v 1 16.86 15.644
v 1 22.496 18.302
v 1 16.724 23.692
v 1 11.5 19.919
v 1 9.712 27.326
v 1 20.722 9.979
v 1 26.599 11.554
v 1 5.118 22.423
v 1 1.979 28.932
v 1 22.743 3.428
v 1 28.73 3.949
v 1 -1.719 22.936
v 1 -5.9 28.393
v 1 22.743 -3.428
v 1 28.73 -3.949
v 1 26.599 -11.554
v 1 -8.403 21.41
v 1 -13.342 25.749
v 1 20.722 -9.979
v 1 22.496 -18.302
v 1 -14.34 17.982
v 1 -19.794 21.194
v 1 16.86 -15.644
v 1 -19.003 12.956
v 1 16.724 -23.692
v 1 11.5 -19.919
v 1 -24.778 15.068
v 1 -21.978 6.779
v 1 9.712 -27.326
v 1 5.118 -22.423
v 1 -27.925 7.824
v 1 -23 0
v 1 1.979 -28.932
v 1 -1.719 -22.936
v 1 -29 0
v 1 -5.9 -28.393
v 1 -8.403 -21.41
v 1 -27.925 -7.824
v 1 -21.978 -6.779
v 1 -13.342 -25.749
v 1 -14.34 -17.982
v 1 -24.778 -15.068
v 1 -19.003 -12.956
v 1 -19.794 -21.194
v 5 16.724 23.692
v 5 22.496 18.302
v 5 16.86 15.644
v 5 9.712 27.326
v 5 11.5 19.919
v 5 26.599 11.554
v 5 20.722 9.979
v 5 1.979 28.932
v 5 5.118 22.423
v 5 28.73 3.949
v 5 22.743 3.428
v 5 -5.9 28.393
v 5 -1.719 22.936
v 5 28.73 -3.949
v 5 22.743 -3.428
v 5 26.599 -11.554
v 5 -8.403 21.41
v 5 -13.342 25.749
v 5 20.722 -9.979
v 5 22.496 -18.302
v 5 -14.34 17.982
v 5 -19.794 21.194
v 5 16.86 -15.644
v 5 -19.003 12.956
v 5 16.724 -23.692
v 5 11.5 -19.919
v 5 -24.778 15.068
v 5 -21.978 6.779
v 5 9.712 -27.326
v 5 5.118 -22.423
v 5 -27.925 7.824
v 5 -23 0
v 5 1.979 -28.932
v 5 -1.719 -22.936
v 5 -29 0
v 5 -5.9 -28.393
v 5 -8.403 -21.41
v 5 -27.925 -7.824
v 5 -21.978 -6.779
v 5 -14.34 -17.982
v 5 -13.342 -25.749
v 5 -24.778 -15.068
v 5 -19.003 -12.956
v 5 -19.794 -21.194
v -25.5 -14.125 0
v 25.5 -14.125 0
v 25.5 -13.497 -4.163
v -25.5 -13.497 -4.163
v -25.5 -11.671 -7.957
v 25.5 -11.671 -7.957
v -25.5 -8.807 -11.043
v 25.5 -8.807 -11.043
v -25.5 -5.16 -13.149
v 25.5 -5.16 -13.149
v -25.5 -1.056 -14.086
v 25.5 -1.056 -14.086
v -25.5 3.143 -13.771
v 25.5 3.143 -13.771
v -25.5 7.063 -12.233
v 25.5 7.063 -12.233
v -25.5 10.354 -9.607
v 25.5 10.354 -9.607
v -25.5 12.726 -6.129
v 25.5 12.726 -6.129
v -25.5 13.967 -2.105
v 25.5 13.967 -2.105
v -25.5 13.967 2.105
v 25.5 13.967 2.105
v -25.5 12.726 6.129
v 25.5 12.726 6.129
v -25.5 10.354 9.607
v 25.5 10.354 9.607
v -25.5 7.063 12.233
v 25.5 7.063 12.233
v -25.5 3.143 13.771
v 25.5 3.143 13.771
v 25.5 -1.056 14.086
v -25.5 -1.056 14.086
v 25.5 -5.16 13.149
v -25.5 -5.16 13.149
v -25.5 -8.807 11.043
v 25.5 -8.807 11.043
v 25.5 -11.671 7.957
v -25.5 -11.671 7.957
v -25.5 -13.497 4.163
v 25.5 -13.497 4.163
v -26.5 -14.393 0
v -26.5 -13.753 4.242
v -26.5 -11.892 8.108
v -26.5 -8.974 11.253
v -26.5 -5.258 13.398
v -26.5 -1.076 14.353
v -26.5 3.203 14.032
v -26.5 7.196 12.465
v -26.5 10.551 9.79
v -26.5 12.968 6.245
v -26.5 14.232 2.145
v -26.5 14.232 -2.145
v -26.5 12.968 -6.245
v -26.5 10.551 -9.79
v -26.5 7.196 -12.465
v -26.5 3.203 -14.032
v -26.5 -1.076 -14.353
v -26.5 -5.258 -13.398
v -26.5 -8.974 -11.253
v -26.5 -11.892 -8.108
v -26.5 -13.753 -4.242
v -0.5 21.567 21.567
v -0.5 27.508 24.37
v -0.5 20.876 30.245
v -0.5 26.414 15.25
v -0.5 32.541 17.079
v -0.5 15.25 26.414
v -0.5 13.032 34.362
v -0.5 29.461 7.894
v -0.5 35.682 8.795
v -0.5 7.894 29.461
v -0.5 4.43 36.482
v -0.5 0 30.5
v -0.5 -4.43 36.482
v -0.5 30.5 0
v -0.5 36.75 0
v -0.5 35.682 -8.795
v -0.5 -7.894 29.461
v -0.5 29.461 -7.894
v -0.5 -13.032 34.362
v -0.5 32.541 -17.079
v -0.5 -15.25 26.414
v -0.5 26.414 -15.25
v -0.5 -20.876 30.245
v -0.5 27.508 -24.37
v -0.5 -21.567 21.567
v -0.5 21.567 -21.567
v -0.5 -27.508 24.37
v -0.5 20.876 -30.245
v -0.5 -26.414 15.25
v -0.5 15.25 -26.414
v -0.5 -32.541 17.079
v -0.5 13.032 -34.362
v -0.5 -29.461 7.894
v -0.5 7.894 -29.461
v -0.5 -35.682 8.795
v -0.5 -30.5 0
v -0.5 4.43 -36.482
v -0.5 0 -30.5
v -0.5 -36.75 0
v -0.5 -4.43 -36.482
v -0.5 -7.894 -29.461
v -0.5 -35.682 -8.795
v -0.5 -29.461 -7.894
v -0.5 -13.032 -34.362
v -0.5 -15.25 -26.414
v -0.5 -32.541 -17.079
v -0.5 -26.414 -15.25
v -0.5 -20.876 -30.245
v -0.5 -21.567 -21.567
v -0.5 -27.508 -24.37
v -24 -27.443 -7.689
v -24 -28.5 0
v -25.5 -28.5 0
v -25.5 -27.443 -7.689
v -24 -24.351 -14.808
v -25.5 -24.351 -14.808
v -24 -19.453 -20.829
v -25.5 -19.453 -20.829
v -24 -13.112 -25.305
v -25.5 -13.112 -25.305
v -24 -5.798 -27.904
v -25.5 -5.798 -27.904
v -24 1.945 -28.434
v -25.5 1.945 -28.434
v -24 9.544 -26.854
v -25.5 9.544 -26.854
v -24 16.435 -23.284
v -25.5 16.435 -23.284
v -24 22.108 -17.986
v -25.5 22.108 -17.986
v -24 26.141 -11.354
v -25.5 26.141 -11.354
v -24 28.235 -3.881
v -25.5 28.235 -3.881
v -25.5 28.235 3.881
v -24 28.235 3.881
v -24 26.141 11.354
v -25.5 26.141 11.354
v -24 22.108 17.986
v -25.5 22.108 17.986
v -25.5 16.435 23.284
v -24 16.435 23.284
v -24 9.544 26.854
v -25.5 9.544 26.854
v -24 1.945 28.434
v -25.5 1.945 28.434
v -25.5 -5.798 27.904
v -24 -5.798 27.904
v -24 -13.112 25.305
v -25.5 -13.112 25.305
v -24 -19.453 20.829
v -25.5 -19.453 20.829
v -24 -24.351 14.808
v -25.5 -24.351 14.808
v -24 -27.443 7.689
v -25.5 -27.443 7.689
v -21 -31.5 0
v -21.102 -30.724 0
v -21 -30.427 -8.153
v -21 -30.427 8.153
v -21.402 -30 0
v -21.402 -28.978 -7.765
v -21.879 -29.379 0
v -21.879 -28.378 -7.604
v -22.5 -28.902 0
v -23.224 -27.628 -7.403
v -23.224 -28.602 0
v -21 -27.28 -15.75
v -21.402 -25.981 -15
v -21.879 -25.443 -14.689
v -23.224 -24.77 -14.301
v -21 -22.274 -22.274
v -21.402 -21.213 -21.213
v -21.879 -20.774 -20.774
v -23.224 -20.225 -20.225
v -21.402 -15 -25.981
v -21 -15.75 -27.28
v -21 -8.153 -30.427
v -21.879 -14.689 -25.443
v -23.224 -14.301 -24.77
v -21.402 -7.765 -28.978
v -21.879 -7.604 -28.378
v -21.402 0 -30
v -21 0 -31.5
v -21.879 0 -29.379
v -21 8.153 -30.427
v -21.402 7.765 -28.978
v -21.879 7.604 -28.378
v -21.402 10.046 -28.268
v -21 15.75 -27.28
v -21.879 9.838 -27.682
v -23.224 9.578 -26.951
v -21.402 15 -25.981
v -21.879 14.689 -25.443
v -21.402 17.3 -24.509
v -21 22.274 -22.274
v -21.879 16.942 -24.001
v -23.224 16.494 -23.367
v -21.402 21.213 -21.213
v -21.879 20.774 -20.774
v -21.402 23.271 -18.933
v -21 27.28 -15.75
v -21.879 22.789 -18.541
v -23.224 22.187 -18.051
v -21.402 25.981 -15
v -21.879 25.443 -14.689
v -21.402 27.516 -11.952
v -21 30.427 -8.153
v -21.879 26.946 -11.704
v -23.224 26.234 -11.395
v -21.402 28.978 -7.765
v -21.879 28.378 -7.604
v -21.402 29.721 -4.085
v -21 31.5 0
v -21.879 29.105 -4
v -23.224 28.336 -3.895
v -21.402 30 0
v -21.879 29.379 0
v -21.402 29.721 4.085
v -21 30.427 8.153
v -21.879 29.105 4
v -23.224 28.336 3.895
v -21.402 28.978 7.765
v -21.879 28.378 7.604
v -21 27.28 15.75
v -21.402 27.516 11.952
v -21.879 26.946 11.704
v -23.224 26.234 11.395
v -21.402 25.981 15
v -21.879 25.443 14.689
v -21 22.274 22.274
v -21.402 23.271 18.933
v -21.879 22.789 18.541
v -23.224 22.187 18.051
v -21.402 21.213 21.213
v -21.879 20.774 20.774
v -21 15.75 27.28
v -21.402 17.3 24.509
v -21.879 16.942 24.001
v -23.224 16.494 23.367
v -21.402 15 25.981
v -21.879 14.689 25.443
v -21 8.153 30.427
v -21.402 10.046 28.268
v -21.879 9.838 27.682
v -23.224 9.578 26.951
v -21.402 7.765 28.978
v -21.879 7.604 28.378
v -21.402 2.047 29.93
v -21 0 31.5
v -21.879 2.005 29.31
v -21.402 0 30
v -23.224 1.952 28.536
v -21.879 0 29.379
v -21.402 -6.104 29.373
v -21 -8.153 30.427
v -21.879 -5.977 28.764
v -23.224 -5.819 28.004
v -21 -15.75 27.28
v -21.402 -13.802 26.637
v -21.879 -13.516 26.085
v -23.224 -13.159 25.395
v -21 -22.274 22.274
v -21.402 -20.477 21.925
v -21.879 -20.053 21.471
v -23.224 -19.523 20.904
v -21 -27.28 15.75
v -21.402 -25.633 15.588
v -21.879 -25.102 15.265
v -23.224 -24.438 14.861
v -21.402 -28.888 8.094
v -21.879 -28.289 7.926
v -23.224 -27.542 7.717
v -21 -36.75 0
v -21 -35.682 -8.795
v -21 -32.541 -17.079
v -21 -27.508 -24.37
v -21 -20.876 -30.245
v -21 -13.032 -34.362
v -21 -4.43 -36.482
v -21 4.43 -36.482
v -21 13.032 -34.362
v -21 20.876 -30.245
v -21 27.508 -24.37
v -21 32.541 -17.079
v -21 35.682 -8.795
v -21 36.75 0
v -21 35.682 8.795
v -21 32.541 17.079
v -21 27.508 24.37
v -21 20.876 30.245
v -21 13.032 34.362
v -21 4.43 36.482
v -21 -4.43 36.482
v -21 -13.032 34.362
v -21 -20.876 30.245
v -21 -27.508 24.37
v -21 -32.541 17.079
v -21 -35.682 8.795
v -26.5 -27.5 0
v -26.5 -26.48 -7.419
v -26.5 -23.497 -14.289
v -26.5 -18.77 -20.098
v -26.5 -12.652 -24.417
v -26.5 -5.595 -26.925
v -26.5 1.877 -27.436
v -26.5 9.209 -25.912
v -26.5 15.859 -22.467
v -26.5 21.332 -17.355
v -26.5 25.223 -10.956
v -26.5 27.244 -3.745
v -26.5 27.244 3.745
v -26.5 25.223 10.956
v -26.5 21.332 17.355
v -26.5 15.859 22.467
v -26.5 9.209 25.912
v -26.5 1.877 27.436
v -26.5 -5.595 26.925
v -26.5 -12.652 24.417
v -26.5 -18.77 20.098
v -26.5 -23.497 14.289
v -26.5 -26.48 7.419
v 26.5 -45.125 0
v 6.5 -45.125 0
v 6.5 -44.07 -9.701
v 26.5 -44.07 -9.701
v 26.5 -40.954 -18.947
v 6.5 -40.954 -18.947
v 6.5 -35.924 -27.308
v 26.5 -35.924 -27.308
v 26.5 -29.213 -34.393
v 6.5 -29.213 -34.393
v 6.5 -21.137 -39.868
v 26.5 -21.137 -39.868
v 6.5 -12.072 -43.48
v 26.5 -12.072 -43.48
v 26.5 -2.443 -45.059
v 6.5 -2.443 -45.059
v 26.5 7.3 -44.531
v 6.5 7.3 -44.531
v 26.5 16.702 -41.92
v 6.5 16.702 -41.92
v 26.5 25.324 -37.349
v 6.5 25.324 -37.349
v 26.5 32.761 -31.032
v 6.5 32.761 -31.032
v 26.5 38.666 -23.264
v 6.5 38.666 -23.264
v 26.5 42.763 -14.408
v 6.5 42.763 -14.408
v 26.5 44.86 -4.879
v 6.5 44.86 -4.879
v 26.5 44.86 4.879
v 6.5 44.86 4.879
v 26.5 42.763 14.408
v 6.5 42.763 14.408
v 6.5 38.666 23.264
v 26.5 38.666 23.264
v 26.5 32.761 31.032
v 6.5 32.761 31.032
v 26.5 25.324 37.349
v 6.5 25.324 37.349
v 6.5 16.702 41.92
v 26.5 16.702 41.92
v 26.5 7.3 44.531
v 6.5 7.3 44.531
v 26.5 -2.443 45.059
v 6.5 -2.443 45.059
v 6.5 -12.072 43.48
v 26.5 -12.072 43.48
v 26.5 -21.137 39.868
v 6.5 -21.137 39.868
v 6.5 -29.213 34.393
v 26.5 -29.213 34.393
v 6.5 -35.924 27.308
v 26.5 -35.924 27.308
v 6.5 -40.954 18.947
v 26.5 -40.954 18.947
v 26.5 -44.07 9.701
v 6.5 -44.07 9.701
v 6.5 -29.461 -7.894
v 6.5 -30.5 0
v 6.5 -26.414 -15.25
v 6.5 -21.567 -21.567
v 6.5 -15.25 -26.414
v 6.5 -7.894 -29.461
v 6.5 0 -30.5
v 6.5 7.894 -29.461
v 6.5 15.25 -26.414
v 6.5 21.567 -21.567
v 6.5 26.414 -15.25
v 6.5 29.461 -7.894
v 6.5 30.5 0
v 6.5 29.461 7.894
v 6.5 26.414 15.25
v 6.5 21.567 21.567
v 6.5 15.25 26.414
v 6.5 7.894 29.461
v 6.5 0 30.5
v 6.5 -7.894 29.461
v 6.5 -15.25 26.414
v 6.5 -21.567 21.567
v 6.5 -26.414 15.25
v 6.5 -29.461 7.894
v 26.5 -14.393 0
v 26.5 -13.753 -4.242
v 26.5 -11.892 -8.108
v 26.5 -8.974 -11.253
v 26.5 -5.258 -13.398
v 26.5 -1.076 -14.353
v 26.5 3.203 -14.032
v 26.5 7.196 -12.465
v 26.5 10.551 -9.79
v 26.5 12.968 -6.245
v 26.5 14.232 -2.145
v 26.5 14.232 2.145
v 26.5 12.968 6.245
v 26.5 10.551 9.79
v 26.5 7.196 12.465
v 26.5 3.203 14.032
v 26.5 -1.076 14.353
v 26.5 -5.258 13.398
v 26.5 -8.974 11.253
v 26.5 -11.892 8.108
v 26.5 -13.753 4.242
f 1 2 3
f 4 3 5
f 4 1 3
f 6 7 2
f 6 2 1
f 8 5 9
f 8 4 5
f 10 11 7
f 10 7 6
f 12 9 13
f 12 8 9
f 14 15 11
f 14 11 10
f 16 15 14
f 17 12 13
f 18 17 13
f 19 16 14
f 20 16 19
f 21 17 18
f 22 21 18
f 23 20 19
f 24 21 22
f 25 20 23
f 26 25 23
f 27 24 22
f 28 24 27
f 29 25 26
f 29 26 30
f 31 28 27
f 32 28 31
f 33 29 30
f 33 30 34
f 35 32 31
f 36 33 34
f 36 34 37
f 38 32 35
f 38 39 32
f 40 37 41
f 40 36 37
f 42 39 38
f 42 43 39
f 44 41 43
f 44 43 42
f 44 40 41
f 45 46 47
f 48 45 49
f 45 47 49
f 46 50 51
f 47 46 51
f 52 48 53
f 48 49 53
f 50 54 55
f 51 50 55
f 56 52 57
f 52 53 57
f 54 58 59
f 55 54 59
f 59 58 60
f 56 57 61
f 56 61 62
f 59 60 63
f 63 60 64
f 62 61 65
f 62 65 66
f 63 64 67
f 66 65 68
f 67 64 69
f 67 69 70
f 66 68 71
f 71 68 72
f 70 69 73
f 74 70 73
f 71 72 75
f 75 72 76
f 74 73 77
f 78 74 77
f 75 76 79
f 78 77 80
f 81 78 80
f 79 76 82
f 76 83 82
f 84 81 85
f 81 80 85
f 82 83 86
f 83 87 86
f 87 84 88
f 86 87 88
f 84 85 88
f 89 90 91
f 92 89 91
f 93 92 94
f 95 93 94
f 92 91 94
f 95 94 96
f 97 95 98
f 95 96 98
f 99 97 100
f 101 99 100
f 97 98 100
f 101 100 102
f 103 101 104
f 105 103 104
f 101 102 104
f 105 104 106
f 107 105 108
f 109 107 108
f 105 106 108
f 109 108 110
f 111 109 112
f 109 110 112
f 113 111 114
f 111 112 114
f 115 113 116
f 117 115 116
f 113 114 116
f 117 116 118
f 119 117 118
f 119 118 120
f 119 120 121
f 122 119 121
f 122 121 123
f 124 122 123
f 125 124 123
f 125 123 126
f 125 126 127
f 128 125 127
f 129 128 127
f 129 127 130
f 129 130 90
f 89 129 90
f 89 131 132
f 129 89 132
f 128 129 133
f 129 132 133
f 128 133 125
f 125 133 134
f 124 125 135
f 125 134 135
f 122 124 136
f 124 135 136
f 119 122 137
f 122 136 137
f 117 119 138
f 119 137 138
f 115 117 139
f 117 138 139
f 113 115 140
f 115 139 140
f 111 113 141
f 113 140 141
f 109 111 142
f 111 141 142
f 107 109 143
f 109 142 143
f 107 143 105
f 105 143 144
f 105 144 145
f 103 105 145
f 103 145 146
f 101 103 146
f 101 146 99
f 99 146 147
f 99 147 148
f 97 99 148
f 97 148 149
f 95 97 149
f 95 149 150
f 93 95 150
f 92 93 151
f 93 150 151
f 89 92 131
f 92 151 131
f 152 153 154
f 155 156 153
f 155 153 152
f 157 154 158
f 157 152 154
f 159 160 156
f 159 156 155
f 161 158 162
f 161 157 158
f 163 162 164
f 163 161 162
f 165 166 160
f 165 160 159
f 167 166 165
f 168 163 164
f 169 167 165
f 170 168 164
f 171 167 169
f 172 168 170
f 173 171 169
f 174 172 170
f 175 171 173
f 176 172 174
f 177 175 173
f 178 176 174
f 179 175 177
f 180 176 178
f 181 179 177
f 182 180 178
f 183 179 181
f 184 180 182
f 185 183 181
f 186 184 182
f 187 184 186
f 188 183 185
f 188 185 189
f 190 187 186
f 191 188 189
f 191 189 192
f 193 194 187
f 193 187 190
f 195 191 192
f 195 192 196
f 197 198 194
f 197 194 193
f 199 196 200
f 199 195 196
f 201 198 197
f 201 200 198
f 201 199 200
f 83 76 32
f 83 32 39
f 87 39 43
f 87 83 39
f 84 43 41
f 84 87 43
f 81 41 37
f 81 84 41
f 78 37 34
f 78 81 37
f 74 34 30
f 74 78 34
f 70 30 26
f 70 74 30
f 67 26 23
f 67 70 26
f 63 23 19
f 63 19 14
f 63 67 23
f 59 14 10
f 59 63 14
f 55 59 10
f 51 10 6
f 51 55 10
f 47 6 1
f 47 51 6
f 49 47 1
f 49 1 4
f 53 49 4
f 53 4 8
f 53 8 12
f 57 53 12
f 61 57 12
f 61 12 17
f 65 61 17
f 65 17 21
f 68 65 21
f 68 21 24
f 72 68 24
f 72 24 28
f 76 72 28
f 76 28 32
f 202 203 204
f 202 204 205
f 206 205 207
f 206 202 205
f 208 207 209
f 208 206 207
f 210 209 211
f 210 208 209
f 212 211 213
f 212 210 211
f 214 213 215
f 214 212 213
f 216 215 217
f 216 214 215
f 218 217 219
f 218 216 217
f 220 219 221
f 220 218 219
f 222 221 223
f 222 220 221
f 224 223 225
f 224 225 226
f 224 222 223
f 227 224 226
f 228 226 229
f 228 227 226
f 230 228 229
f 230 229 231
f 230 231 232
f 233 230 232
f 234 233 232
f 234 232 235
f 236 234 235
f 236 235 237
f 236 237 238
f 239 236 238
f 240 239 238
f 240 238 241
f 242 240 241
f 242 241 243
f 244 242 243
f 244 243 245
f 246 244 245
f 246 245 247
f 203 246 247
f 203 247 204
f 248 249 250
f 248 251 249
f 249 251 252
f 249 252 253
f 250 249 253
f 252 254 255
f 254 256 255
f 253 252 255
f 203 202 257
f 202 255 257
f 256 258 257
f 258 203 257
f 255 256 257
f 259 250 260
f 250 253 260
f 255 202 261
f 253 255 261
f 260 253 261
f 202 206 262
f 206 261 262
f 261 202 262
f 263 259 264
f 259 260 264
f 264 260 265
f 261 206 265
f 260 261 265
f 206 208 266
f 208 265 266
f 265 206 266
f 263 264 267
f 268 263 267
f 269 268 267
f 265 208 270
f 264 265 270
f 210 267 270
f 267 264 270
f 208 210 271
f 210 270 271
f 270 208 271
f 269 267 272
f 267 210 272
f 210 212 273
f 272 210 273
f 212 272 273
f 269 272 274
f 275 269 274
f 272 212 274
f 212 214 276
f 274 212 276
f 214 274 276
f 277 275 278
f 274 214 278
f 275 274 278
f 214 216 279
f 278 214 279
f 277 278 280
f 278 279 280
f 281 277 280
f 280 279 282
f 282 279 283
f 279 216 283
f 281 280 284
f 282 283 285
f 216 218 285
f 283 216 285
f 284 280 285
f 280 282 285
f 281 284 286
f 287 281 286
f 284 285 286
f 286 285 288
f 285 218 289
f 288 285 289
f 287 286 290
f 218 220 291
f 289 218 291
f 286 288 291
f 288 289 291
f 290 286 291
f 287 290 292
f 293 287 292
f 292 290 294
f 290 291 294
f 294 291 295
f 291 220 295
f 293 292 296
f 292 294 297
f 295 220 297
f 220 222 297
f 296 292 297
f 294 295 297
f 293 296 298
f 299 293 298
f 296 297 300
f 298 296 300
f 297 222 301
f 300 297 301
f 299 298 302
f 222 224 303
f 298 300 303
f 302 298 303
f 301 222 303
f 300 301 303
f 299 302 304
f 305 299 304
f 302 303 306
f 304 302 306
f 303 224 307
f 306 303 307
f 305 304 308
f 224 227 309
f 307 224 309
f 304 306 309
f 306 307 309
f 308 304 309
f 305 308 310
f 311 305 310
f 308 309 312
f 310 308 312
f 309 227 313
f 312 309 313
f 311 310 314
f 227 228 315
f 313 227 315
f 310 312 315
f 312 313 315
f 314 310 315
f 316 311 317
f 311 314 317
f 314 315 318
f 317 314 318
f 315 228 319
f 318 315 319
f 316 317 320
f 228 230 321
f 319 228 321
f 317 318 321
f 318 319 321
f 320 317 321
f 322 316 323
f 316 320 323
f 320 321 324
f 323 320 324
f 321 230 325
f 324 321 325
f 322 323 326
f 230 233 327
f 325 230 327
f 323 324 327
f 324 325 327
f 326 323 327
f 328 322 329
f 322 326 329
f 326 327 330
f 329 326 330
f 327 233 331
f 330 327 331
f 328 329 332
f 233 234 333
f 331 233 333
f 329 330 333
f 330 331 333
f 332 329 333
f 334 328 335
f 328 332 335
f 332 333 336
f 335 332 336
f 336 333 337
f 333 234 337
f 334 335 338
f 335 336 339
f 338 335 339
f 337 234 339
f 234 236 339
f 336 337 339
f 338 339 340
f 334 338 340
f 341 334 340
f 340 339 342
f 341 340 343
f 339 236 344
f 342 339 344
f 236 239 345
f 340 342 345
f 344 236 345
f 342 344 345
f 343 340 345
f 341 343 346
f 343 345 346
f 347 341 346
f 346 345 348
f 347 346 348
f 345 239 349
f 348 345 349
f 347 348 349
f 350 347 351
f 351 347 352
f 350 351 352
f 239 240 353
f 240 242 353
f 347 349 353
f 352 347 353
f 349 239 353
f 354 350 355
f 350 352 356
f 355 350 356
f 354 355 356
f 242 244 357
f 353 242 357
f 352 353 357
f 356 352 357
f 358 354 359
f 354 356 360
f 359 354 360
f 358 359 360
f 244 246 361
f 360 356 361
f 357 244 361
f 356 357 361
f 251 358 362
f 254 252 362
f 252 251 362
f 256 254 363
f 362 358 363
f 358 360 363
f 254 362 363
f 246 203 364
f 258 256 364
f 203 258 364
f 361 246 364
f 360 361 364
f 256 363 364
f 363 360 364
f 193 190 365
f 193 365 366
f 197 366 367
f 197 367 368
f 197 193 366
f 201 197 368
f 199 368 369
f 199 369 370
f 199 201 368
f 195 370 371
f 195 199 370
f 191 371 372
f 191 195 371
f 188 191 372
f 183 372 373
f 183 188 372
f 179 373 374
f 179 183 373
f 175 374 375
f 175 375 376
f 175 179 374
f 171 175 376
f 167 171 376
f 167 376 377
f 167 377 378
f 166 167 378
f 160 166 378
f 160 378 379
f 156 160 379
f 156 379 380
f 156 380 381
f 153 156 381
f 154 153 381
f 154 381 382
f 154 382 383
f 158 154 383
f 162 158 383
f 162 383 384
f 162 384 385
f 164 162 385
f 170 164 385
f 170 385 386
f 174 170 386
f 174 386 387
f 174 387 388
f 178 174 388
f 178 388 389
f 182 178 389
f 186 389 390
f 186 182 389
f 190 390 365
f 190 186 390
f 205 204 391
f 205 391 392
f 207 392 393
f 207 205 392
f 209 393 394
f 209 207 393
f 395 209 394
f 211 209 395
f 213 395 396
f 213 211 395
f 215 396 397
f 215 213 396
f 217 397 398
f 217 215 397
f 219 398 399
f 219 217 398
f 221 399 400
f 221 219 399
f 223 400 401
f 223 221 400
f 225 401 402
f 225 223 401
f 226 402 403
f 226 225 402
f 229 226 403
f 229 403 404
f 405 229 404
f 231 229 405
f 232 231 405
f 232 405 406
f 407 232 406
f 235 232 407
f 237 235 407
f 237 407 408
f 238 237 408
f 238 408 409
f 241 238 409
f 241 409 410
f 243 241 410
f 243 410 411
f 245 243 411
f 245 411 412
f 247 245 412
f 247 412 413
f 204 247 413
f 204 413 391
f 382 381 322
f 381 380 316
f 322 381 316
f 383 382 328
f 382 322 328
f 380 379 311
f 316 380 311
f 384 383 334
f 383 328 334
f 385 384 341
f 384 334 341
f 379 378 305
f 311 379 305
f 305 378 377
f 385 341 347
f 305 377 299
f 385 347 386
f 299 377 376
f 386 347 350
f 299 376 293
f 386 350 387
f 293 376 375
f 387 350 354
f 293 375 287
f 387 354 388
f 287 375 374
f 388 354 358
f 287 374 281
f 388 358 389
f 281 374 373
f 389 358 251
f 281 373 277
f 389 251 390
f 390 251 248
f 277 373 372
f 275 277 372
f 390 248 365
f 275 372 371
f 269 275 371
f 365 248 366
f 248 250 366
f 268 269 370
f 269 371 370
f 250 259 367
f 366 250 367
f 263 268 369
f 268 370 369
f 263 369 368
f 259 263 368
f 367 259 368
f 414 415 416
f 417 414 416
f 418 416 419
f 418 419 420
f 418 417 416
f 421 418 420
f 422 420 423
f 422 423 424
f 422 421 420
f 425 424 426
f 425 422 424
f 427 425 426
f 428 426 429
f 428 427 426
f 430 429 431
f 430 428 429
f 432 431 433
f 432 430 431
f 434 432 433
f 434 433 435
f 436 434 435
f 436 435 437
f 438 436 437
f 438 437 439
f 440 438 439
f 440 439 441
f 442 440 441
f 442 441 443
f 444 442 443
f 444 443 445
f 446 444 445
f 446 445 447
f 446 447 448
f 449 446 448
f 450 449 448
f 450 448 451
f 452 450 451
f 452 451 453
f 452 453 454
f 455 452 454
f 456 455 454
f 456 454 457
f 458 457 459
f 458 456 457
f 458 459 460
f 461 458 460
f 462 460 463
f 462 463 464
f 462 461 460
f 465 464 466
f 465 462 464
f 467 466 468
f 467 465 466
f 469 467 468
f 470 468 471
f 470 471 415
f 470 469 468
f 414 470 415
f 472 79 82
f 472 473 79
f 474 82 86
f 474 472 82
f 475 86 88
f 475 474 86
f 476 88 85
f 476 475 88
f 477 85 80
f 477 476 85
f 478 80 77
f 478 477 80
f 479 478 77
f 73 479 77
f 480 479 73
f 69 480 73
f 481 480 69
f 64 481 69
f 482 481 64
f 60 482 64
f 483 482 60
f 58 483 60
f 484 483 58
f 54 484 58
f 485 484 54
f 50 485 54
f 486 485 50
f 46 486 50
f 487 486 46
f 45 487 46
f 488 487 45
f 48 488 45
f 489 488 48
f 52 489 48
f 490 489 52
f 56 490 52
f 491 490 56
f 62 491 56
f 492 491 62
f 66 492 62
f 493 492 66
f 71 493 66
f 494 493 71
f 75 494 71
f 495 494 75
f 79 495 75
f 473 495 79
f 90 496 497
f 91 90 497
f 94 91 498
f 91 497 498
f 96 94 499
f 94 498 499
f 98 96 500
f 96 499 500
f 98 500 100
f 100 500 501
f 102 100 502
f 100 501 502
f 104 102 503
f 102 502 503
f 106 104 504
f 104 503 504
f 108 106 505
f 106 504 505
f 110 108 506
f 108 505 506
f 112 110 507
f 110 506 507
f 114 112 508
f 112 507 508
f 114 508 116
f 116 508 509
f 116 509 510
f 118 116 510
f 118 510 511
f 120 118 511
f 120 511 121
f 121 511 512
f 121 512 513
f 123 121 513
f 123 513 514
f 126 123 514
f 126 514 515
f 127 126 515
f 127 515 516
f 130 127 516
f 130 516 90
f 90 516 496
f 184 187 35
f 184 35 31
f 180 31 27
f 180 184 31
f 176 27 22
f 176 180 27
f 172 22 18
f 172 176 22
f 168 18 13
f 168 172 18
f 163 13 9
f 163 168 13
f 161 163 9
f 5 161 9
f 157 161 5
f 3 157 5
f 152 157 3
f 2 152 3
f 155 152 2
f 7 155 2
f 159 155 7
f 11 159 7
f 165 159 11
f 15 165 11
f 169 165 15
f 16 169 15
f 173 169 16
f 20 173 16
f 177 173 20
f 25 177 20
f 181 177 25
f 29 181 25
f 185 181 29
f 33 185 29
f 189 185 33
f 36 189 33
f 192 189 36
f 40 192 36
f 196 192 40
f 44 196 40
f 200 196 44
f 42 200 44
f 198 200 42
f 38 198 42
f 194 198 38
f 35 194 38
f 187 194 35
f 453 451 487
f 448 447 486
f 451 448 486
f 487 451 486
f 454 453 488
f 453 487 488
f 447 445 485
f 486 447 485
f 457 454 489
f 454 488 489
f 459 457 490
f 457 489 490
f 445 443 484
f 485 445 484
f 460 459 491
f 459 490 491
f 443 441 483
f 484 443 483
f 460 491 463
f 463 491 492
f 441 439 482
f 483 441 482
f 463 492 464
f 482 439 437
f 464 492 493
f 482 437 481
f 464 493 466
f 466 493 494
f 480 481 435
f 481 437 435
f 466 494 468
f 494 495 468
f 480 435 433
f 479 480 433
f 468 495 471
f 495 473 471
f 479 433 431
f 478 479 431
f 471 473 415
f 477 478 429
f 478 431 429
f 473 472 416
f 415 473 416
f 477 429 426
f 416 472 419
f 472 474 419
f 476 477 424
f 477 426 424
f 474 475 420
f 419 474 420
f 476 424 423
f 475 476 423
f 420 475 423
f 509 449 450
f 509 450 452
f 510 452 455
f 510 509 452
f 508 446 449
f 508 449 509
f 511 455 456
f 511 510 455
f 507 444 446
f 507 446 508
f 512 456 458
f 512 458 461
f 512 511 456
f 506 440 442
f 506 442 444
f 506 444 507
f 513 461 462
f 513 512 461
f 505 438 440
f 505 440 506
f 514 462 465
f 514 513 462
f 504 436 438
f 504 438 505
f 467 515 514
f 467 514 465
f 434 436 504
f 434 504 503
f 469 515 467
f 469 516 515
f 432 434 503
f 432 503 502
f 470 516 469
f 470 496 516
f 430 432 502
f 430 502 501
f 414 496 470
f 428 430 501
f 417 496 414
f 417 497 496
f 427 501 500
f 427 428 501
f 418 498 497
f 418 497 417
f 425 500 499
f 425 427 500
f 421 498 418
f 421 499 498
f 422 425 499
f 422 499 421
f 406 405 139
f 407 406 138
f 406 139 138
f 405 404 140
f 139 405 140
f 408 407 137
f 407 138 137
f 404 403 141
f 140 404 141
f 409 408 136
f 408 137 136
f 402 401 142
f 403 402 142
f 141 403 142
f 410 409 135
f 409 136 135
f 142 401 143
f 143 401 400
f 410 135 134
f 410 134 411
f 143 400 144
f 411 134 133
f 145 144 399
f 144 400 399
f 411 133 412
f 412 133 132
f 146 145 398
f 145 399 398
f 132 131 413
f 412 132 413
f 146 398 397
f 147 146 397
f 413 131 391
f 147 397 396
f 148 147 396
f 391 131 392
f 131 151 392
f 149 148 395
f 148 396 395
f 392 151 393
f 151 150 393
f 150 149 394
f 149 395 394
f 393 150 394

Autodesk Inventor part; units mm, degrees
ref_plane "YZ Plane" through (0, 0, 0) normal (1, 0, 0) x (0, 1, 0)
ref_plane "XZ Plane" through (0, 0, 0) normal (0, 1, 0) x (-1, 0, 0)
ref_plane "XY Plane" through (0, 0, 0) normal (0, 0, 1) x (1, 0, 0)
sketch "Эскиз1" plane through (0, 0, 0) normal (0, 0, 1) x (1, 0, 0)
  line L0 (-26.5, 0) -> (26.5, 0)
  line L1 (-26.5, -14.3929) -> (-26.5, -27.5)
  line L2 (-25.5, -28.5) -> (-24, -28.5)
  line L3 (-26.5, -14.3929) -> (-25.5, -14.125)
  line L4 (-25.5, -14.125) -> (25.5, -14.125)
  line L5 (-25.5, -28.5) -> (-26.5, -27.5)
  line L6 (-21, -31.5) -> (-21, -36.75)
  arc A0 (-21, -31.5) -> (-24, -28.5) centre (-24, -31.5) ccw
  line L7 (-21, -36.75) -> (-0.5, -36.75)
  line L8 (-0.5, -36.75) -> (-0.5, -30.5)
  line L9 (-0.5, -30.5) -> (1, -29)
  line L10 (1, -29) -> (1, -23)
  line L11 (1, -23) -> (5, -23)
  line L12 (5, -23) -> (5, -29)
  line L13 (5, -29) -> (6.5, -30.5)
  line L14 (6.5, -30.5) -> (6.5, -45.125)
  line L15 (6.5, -45.125) -> (26.5, -45.125)
  line L16 (26.5, -45.125) -> (26.5, -14.3929)
  line L17 (26.5, -14.3929) -> (25.5, -14.125)
  point P0 (0, 0)
  point P1 (0, 0)
  point P2 (-26.5, -28.5)
  dimension "d0" = 53
  dimension "d1" = 28.25
  dimension "d2" = 15
  dimension "d3" = 57
  dimension "d4" = 1
  dimension "d5" = 1
  dimension "d6" = 45
  dimension "d7" = 3
  dimension "d8" = 73.5
  dimension "d9" = 5.5
  dimension "d10" = 7
  dimension "d11" = 4
  dimension "d12" = 46
  dimension "d13" = 21.5
  dimension "d14" = 20
  dimension "d15" = 58
  dimension "d16" = 45
  dimension "d17" = 15
  dimension "d18" = 1
  dimension "d19" = 90.25
revolve "Вращение1" add sketch "Эскиз1" angle 360 about axis through (-26.5, 0, 0) along (1, 0, 0)
properties part number "71. Блок шестерен заднего хода"
